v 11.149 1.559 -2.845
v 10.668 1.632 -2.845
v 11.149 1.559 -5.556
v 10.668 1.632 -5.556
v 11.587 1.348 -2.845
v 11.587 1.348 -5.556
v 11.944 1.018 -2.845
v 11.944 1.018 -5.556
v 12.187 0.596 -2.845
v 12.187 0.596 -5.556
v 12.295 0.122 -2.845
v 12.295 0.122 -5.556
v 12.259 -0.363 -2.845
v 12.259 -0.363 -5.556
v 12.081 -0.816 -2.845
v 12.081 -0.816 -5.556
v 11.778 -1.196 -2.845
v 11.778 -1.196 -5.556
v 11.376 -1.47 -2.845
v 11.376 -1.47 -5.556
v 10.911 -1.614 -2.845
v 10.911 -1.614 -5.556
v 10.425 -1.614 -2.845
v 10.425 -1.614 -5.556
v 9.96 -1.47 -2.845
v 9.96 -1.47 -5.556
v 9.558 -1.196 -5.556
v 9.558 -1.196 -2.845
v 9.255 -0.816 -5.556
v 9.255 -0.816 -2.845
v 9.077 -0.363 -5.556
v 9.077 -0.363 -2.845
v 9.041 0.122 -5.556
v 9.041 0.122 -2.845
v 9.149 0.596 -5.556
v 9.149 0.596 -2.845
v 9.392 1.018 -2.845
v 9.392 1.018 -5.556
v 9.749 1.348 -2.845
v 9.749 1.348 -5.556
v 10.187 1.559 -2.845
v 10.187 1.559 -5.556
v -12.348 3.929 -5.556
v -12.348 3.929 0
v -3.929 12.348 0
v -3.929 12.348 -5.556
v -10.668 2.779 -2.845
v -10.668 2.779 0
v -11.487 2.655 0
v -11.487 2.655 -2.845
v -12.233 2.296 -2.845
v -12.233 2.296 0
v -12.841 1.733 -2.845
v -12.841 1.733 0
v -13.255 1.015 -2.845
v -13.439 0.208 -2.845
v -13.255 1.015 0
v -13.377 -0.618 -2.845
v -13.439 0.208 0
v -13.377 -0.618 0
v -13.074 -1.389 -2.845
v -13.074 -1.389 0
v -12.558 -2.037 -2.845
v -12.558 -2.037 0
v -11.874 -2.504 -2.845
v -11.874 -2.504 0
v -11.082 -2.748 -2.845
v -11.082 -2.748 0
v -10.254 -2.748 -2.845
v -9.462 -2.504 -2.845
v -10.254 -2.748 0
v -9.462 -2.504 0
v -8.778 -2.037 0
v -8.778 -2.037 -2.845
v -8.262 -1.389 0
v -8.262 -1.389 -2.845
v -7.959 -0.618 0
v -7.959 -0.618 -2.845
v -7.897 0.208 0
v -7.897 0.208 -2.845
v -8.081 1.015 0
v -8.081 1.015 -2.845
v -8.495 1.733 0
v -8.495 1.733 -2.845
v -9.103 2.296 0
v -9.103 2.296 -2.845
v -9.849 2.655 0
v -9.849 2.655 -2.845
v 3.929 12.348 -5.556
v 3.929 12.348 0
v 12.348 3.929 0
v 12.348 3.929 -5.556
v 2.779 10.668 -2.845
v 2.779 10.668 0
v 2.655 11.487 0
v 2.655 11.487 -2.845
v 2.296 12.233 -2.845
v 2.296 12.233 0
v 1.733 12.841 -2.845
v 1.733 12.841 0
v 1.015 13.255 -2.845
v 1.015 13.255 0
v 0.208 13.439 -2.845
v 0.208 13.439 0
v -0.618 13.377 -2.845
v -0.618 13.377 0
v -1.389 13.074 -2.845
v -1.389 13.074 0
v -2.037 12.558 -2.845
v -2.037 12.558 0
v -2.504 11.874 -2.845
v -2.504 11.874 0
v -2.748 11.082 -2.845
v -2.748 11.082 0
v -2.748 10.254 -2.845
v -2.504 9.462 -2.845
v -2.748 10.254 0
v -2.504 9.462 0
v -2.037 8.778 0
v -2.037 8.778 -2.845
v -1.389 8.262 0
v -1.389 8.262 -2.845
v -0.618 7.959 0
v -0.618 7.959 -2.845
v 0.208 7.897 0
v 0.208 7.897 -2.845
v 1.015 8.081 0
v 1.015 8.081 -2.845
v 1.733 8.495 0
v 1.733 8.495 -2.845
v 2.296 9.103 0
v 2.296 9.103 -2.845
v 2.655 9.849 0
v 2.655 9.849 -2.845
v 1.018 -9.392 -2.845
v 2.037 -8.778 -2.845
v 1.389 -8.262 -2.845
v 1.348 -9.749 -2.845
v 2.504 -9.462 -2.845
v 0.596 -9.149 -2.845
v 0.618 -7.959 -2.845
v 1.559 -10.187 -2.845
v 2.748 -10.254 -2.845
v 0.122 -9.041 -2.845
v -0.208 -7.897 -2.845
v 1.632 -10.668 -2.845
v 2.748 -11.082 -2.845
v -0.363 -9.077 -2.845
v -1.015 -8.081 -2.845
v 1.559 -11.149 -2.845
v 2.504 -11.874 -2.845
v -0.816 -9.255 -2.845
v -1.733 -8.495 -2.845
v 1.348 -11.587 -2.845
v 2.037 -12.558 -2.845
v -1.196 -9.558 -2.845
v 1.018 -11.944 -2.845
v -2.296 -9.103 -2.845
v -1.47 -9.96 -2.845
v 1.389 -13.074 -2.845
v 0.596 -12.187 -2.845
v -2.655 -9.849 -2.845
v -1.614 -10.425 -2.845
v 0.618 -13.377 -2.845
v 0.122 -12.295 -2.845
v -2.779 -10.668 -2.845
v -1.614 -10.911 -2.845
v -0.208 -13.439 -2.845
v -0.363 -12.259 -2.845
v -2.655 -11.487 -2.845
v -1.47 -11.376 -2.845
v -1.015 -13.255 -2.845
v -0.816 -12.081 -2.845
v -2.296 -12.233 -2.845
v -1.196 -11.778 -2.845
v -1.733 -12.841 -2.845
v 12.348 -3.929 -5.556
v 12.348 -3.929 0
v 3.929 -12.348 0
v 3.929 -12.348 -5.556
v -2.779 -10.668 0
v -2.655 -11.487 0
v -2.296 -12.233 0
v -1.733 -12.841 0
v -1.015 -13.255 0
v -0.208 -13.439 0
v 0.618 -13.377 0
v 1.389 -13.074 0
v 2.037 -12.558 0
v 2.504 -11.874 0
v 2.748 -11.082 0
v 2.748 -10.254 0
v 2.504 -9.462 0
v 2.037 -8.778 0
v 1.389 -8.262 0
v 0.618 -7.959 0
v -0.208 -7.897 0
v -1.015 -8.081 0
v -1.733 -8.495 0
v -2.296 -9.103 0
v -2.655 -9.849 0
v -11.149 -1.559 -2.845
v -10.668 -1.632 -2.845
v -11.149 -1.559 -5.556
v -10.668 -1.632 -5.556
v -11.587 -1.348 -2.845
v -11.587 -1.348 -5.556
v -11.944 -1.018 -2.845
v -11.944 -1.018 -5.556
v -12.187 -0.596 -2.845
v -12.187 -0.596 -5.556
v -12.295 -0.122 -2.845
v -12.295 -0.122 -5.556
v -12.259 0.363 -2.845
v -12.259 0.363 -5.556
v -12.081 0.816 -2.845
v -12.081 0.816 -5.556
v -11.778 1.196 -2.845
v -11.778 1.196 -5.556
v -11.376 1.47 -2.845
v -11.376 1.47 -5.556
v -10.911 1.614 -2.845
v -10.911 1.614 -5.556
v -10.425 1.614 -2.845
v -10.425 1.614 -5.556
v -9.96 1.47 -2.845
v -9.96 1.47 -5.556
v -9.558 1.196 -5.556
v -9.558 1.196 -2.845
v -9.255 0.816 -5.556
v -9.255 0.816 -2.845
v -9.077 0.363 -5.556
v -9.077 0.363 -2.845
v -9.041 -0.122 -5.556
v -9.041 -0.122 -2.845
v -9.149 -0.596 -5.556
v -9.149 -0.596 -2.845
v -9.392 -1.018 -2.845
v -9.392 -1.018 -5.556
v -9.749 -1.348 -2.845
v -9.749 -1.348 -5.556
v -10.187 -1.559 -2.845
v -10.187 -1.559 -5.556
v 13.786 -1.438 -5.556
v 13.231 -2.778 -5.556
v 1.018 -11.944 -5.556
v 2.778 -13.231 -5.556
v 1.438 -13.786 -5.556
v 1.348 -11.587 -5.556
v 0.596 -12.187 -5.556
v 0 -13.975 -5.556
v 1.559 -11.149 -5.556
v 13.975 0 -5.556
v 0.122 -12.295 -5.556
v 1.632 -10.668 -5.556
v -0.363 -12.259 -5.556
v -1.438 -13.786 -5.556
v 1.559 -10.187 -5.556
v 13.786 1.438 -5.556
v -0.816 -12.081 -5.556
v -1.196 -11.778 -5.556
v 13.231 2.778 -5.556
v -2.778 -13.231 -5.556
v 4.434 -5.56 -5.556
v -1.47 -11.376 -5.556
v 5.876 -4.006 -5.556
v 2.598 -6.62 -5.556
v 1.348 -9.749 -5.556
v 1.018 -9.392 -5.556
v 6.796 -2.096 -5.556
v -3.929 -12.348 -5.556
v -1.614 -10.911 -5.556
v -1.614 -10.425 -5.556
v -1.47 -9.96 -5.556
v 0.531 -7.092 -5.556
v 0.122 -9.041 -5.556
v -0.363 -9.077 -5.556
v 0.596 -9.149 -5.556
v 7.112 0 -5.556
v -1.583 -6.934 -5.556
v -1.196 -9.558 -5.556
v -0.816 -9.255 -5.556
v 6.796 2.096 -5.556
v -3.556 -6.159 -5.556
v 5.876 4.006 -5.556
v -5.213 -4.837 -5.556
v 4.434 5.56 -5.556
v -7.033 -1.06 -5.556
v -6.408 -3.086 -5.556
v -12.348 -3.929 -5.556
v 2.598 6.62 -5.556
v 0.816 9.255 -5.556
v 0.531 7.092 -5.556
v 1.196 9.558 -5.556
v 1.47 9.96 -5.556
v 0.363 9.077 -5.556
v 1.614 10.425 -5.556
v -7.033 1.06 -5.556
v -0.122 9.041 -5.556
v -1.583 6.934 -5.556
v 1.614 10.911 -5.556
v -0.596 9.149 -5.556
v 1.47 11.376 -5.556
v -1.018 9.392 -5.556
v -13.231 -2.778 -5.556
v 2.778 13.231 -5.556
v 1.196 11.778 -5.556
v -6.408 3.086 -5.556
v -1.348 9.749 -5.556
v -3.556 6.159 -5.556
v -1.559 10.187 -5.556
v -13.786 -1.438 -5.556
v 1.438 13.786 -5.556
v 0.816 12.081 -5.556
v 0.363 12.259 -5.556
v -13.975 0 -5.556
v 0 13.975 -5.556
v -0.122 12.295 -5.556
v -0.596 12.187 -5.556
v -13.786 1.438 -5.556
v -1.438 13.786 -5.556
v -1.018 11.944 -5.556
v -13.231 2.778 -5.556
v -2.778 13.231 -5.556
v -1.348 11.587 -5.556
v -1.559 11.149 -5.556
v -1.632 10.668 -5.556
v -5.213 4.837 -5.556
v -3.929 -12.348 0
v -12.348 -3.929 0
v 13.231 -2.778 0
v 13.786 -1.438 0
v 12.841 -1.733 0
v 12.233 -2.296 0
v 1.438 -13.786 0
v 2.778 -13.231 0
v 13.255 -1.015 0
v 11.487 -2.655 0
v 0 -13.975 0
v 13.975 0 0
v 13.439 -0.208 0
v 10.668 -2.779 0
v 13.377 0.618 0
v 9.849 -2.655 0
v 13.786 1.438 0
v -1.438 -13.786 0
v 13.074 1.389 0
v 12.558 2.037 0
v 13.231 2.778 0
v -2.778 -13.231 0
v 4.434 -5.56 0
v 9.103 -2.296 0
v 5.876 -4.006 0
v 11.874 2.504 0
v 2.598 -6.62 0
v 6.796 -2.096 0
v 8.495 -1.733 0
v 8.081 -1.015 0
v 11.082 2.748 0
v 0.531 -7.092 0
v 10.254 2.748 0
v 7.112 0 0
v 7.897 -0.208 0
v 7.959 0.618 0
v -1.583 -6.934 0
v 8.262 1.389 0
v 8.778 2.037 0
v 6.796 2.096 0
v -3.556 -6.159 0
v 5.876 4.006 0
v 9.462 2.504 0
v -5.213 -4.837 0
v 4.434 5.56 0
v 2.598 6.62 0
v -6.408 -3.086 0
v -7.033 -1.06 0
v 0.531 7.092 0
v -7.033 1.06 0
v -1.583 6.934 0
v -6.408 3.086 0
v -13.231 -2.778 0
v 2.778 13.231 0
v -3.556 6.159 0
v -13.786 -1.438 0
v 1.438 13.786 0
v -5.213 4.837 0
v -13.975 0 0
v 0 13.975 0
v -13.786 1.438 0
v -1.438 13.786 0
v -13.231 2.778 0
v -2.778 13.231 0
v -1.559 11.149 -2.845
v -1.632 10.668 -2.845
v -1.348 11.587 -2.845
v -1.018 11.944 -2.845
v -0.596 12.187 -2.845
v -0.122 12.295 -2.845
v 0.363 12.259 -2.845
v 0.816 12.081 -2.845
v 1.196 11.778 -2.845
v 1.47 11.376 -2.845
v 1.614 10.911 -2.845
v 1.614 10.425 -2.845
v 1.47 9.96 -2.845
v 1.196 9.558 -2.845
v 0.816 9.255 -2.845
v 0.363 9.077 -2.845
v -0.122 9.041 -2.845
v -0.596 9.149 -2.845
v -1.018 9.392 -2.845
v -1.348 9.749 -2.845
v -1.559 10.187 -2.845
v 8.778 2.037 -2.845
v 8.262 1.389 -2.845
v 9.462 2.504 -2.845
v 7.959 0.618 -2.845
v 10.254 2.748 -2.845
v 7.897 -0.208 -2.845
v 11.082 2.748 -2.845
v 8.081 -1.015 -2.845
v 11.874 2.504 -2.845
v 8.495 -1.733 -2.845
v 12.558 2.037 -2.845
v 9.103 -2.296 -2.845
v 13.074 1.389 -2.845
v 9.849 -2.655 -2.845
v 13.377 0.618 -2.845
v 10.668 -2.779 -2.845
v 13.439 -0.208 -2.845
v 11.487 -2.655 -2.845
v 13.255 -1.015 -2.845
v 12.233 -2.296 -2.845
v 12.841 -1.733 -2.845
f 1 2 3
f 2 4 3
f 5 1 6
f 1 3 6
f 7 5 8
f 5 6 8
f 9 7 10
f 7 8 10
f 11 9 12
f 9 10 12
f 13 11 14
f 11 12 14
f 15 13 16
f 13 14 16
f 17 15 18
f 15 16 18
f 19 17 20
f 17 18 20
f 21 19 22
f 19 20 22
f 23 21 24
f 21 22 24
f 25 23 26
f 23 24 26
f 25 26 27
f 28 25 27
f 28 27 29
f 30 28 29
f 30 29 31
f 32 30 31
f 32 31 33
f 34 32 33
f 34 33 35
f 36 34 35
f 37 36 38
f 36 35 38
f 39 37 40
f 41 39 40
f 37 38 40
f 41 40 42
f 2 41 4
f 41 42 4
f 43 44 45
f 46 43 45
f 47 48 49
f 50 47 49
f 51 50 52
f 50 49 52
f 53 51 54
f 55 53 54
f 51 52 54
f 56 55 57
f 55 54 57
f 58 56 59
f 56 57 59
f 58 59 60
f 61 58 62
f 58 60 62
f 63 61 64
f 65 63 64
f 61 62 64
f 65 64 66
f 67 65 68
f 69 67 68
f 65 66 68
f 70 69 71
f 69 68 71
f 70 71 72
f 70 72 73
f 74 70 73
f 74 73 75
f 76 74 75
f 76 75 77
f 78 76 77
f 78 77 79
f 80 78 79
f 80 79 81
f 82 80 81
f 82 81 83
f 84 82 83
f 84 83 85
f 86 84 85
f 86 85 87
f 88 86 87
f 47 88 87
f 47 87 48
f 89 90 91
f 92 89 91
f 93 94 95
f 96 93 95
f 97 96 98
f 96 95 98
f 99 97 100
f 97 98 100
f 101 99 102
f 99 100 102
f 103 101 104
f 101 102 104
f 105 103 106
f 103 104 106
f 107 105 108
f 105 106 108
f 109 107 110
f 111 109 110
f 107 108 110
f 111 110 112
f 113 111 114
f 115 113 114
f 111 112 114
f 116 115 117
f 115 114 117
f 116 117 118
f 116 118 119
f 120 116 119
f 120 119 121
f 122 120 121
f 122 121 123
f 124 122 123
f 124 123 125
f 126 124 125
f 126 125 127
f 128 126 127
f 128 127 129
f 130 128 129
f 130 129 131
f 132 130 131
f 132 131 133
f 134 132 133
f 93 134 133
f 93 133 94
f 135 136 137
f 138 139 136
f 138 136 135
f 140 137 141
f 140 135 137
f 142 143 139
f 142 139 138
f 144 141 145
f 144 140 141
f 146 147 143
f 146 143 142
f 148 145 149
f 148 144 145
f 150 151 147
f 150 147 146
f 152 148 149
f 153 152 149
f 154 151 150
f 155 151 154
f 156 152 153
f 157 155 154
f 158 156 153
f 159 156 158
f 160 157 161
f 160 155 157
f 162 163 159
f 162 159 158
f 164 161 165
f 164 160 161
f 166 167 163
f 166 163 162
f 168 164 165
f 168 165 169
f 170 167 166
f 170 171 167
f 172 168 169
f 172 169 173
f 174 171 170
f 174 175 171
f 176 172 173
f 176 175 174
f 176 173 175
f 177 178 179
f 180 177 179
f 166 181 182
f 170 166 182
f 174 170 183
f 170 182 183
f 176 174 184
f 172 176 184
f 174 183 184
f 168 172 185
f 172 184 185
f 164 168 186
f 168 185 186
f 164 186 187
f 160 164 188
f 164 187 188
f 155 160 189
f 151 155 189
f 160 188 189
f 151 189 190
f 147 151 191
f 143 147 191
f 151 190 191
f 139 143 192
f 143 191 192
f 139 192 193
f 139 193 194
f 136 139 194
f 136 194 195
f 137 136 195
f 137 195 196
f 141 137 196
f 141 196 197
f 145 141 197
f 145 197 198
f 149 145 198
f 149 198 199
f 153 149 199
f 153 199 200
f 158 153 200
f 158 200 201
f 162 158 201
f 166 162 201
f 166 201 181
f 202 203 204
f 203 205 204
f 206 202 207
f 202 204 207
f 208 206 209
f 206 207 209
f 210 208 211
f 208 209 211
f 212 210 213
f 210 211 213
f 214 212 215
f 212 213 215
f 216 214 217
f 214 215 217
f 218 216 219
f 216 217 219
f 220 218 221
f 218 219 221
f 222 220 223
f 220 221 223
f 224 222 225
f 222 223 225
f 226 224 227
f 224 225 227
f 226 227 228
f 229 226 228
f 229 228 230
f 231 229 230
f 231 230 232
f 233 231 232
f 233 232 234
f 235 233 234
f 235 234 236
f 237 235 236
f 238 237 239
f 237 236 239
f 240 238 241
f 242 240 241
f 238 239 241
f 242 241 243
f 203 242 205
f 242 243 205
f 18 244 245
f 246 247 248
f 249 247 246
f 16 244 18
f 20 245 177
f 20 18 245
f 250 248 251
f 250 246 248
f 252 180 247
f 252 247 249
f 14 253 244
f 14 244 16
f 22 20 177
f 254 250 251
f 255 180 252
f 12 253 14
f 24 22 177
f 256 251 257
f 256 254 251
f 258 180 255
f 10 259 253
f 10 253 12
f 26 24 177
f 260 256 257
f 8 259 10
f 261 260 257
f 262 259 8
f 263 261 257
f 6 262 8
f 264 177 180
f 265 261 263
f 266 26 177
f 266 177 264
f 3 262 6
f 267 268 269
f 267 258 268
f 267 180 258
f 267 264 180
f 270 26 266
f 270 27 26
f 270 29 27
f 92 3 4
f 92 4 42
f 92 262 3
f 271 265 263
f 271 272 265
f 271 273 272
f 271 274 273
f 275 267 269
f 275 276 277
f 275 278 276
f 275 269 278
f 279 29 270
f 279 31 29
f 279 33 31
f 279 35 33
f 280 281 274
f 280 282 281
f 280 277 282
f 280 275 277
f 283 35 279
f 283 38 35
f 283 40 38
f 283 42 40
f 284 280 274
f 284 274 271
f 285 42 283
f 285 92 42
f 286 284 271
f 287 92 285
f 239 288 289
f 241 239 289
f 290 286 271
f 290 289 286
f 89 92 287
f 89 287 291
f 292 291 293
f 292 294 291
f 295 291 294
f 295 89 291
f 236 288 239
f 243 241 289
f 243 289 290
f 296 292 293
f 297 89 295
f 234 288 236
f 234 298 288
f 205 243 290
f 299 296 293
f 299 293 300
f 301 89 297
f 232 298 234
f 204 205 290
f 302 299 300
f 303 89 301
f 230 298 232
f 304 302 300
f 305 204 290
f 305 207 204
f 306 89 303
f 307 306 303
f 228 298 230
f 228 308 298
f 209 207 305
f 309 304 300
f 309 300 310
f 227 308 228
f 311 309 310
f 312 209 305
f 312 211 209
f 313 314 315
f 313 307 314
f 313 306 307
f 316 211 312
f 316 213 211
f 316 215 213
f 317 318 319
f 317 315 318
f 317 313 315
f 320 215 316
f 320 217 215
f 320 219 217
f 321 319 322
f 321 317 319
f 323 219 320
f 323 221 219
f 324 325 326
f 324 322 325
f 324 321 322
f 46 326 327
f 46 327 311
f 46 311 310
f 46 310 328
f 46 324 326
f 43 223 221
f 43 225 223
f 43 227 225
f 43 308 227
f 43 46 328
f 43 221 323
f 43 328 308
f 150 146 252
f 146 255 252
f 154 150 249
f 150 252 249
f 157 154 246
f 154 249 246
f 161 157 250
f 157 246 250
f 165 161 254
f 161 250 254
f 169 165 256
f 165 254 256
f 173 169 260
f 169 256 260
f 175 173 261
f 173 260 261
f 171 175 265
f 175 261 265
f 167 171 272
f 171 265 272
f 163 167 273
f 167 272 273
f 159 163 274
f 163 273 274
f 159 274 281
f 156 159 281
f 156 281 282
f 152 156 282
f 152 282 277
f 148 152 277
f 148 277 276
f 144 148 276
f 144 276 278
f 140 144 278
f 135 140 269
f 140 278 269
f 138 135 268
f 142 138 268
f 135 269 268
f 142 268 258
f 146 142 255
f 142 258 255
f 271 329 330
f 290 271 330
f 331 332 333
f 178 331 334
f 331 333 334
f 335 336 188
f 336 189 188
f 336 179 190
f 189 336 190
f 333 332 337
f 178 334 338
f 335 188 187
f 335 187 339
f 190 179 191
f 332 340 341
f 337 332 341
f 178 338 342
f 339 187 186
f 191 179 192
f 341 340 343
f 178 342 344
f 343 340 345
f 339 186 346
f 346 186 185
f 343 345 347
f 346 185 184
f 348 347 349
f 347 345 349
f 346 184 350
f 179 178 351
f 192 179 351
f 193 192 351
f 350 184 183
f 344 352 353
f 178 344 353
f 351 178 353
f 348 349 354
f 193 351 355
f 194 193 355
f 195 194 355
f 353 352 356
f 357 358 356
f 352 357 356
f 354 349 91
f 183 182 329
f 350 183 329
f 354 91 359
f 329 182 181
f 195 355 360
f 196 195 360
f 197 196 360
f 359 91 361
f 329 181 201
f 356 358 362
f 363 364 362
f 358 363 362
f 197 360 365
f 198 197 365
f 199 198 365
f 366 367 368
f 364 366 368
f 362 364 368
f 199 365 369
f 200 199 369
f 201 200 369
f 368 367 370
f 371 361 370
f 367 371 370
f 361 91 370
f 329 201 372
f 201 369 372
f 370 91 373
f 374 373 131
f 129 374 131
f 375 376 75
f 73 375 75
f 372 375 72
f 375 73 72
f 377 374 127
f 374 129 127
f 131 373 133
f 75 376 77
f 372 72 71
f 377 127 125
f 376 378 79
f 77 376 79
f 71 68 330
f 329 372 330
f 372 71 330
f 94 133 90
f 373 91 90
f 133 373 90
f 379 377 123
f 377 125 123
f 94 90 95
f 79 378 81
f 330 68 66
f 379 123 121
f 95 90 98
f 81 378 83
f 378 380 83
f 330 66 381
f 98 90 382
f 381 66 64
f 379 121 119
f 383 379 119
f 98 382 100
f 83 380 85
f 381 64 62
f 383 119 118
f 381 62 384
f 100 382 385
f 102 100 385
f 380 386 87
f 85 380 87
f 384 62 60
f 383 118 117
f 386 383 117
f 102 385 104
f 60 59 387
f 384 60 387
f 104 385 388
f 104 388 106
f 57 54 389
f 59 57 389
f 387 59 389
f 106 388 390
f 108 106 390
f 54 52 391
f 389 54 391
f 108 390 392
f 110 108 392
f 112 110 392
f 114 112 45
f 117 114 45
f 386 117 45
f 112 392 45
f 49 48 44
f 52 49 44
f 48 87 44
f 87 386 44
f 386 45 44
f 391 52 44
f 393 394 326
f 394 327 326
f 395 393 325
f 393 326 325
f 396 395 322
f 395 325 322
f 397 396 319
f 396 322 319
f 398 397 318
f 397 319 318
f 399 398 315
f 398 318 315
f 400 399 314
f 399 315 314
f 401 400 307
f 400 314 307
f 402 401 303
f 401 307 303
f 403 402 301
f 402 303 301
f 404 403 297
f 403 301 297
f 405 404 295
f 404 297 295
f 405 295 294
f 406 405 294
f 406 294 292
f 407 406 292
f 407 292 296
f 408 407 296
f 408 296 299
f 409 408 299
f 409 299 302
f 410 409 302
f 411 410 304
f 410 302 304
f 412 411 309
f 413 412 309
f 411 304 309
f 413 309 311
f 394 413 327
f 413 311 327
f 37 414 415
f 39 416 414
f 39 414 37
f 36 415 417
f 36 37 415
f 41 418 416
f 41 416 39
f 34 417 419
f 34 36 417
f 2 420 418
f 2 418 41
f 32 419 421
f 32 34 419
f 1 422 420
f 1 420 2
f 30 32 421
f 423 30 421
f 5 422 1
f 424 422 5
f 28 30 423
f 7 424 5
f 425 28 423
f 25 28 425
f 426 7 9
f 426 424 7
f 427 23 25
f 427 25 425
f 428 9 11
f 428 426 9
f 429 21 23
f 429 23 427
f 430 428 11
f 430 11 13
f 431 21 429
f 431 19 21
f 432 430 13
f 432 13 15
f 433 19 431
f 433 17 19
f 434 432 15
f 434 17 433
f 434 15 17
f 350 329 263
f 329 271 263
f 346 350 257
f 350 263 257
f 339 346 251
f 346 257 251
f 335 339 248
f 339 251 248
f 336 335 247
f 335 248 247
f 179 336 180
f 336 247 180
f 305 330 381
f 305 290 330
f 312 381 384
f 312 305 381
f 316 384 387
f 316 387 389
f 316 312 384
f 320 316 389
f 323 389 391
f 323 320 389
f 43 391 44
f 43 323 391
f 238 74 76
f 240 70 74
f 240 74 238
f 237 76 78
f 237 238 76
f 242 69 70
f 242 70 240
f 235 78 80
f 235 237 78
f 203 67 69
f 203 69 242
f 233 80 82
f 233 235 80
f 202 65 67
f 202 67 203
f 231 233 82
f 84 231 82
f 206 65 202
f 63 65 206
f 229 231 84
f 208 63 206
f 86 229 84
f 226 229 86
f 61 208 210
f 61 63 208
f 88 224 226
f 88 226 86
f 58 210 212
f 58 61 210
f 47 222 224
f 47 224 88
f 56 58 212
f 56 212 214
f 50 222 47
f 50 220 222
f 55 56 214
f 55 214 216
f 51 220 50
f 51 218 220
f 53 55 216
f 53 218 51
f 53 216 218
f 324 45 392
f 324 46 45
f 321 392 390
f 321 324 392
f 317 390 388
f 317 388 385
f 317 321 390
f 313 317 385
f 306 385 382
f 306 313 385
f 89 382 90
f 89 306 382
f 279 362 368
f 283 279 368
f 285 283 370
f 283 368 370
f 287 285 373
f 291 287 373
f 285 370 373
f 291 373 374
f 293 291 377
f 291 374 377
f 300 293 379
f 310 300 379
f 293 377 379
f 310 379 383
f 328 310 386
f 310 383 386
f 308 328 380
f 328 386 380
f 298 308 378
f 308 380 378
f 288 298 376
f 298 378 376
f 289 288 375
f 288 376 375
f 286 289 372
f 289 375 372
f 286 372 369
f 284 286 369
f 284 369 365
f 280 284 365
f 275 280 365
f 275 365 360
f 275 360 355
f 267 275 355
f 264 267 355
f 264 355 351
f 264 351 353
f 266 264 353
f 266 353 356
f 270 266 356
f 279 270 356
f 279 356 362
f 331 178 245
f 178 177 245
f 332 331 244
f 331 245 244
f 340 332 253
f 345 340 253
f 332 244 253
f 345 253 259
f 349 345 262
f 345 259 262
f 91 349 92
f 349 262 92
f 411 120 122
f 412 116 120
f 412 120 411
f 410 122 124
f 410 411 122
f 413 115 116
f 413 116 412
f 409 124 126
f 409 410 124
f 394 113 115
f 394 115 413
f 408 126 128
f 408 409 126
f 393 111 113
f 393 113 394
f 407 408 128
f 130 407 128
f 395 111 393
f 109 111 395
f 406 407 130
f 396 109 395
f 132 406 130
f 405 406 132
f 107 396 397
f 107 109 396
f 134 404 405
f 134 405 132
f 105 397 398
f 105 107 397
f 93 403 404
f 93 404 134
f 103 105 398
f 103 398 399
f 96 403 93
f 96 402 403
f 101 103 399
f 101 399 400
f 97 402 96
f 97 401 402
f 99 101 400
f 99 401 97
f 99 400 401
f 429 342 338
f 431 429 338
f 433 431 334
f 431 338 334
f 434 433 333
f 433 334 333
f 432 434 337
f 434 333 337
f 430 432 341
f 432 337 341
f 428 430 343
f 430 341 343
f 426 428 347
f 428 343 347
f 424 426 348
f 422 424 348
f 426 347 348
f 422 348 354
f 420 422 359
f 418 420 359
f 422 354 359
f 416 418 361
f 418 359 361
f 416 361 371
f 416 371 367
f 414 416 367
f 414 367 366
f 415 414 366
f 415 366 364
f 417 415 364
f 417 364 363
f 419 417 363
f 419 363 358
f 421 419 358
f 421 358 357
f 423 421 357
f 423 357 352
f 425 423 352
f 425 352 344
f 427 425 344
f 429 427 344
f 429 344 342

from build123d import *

# Parameters (mm, degrees)
BOSS_EXTRUDE1_DEPTH                            = 5.55625
SKETCH2_R                                      = 7.112
CUT_EXTRUDE1_DEPTH                             = 6.55625
CBORE_FOR_4_SOCKET_HEAD_CAP_SCREW1_D           = 3.2639
CBORE_FOR_4_SOCKET_HEAD_CAP_SCREW1_CBORE_D     = 5.55752
CBORE_FOR_4_SOCKET_HEAD_CAP_SCREW1_CBORE_DEPTH = 2.8448
CIRPATTERN1_COUNT                              = 4
FILLET1_R                                      = 5.55625


with BuildPart() as part:
    # Sketch1 → Boss-Extrude1 (new body)
    with BuildSketch(Plane.XY):
        Polygon((0, -16.276714219), (-16.276714219, 0), (0, 16.276714219), (16.276714219, 0), align=None)
    extrude(amount=-BOSS_EXTRUDE1_DEPTH)

    # Sketch2 → Cut-Extrude1 (cut, through all)
    with BuildSketch(Plane.XY):
        Circle(SKETCH2_R)
    extrude(amount=-CUT_EXTRUDE1_DEPTH, mode=Mode.SUBTRACT)

    # CBORE for #4 Socket Head Cap Screw1 (through all)
    with Locations(Plane.XY):
        with Locations((0, 10.668)):
            cbore_for_4_socket_head_cap_screw1 = CounterBoreHole(CBORE_FOR_4_SOCKET_HEAD_CAP_SCREW1_D / 2, CBORE_FOR_4_SOCKET_HEAD_CAP_SCREW1_CBORE_D / 2, CBORE_FOR_4_SOCKET_HEAD_CAP_SCREW1_CBORE_DEPTH)

    # CirPattern1: CBORE for #4 Socket Head Cap Screw1 ×4 about axis
    cirpattern1_axis = Axis((0, 0, 0), (0, 0, 1))
    for i in range(1, CIRPATTERN1_COUNT):
        add(cbore_for_4_socket_head_cap_screw1.rotate(cirpattern1_axis, i * 360 / CIRPATTERN1_COUNT), mode=Mode.SUBTRACT)

    # Fillet1
    fillet1_edges = [part.edges().sort_by_distance(p)[0] for p in [
        (0, -16.276714219, -2.778125),
        (-16.276714219, 0, -2.778125),
        (0, 16.276714219, -2.778125),
        (16.276714219, 0, -2.778125),
    ]]
    fillet(fillet1_edges, radius=FILLET1_R)


solid = part.part
